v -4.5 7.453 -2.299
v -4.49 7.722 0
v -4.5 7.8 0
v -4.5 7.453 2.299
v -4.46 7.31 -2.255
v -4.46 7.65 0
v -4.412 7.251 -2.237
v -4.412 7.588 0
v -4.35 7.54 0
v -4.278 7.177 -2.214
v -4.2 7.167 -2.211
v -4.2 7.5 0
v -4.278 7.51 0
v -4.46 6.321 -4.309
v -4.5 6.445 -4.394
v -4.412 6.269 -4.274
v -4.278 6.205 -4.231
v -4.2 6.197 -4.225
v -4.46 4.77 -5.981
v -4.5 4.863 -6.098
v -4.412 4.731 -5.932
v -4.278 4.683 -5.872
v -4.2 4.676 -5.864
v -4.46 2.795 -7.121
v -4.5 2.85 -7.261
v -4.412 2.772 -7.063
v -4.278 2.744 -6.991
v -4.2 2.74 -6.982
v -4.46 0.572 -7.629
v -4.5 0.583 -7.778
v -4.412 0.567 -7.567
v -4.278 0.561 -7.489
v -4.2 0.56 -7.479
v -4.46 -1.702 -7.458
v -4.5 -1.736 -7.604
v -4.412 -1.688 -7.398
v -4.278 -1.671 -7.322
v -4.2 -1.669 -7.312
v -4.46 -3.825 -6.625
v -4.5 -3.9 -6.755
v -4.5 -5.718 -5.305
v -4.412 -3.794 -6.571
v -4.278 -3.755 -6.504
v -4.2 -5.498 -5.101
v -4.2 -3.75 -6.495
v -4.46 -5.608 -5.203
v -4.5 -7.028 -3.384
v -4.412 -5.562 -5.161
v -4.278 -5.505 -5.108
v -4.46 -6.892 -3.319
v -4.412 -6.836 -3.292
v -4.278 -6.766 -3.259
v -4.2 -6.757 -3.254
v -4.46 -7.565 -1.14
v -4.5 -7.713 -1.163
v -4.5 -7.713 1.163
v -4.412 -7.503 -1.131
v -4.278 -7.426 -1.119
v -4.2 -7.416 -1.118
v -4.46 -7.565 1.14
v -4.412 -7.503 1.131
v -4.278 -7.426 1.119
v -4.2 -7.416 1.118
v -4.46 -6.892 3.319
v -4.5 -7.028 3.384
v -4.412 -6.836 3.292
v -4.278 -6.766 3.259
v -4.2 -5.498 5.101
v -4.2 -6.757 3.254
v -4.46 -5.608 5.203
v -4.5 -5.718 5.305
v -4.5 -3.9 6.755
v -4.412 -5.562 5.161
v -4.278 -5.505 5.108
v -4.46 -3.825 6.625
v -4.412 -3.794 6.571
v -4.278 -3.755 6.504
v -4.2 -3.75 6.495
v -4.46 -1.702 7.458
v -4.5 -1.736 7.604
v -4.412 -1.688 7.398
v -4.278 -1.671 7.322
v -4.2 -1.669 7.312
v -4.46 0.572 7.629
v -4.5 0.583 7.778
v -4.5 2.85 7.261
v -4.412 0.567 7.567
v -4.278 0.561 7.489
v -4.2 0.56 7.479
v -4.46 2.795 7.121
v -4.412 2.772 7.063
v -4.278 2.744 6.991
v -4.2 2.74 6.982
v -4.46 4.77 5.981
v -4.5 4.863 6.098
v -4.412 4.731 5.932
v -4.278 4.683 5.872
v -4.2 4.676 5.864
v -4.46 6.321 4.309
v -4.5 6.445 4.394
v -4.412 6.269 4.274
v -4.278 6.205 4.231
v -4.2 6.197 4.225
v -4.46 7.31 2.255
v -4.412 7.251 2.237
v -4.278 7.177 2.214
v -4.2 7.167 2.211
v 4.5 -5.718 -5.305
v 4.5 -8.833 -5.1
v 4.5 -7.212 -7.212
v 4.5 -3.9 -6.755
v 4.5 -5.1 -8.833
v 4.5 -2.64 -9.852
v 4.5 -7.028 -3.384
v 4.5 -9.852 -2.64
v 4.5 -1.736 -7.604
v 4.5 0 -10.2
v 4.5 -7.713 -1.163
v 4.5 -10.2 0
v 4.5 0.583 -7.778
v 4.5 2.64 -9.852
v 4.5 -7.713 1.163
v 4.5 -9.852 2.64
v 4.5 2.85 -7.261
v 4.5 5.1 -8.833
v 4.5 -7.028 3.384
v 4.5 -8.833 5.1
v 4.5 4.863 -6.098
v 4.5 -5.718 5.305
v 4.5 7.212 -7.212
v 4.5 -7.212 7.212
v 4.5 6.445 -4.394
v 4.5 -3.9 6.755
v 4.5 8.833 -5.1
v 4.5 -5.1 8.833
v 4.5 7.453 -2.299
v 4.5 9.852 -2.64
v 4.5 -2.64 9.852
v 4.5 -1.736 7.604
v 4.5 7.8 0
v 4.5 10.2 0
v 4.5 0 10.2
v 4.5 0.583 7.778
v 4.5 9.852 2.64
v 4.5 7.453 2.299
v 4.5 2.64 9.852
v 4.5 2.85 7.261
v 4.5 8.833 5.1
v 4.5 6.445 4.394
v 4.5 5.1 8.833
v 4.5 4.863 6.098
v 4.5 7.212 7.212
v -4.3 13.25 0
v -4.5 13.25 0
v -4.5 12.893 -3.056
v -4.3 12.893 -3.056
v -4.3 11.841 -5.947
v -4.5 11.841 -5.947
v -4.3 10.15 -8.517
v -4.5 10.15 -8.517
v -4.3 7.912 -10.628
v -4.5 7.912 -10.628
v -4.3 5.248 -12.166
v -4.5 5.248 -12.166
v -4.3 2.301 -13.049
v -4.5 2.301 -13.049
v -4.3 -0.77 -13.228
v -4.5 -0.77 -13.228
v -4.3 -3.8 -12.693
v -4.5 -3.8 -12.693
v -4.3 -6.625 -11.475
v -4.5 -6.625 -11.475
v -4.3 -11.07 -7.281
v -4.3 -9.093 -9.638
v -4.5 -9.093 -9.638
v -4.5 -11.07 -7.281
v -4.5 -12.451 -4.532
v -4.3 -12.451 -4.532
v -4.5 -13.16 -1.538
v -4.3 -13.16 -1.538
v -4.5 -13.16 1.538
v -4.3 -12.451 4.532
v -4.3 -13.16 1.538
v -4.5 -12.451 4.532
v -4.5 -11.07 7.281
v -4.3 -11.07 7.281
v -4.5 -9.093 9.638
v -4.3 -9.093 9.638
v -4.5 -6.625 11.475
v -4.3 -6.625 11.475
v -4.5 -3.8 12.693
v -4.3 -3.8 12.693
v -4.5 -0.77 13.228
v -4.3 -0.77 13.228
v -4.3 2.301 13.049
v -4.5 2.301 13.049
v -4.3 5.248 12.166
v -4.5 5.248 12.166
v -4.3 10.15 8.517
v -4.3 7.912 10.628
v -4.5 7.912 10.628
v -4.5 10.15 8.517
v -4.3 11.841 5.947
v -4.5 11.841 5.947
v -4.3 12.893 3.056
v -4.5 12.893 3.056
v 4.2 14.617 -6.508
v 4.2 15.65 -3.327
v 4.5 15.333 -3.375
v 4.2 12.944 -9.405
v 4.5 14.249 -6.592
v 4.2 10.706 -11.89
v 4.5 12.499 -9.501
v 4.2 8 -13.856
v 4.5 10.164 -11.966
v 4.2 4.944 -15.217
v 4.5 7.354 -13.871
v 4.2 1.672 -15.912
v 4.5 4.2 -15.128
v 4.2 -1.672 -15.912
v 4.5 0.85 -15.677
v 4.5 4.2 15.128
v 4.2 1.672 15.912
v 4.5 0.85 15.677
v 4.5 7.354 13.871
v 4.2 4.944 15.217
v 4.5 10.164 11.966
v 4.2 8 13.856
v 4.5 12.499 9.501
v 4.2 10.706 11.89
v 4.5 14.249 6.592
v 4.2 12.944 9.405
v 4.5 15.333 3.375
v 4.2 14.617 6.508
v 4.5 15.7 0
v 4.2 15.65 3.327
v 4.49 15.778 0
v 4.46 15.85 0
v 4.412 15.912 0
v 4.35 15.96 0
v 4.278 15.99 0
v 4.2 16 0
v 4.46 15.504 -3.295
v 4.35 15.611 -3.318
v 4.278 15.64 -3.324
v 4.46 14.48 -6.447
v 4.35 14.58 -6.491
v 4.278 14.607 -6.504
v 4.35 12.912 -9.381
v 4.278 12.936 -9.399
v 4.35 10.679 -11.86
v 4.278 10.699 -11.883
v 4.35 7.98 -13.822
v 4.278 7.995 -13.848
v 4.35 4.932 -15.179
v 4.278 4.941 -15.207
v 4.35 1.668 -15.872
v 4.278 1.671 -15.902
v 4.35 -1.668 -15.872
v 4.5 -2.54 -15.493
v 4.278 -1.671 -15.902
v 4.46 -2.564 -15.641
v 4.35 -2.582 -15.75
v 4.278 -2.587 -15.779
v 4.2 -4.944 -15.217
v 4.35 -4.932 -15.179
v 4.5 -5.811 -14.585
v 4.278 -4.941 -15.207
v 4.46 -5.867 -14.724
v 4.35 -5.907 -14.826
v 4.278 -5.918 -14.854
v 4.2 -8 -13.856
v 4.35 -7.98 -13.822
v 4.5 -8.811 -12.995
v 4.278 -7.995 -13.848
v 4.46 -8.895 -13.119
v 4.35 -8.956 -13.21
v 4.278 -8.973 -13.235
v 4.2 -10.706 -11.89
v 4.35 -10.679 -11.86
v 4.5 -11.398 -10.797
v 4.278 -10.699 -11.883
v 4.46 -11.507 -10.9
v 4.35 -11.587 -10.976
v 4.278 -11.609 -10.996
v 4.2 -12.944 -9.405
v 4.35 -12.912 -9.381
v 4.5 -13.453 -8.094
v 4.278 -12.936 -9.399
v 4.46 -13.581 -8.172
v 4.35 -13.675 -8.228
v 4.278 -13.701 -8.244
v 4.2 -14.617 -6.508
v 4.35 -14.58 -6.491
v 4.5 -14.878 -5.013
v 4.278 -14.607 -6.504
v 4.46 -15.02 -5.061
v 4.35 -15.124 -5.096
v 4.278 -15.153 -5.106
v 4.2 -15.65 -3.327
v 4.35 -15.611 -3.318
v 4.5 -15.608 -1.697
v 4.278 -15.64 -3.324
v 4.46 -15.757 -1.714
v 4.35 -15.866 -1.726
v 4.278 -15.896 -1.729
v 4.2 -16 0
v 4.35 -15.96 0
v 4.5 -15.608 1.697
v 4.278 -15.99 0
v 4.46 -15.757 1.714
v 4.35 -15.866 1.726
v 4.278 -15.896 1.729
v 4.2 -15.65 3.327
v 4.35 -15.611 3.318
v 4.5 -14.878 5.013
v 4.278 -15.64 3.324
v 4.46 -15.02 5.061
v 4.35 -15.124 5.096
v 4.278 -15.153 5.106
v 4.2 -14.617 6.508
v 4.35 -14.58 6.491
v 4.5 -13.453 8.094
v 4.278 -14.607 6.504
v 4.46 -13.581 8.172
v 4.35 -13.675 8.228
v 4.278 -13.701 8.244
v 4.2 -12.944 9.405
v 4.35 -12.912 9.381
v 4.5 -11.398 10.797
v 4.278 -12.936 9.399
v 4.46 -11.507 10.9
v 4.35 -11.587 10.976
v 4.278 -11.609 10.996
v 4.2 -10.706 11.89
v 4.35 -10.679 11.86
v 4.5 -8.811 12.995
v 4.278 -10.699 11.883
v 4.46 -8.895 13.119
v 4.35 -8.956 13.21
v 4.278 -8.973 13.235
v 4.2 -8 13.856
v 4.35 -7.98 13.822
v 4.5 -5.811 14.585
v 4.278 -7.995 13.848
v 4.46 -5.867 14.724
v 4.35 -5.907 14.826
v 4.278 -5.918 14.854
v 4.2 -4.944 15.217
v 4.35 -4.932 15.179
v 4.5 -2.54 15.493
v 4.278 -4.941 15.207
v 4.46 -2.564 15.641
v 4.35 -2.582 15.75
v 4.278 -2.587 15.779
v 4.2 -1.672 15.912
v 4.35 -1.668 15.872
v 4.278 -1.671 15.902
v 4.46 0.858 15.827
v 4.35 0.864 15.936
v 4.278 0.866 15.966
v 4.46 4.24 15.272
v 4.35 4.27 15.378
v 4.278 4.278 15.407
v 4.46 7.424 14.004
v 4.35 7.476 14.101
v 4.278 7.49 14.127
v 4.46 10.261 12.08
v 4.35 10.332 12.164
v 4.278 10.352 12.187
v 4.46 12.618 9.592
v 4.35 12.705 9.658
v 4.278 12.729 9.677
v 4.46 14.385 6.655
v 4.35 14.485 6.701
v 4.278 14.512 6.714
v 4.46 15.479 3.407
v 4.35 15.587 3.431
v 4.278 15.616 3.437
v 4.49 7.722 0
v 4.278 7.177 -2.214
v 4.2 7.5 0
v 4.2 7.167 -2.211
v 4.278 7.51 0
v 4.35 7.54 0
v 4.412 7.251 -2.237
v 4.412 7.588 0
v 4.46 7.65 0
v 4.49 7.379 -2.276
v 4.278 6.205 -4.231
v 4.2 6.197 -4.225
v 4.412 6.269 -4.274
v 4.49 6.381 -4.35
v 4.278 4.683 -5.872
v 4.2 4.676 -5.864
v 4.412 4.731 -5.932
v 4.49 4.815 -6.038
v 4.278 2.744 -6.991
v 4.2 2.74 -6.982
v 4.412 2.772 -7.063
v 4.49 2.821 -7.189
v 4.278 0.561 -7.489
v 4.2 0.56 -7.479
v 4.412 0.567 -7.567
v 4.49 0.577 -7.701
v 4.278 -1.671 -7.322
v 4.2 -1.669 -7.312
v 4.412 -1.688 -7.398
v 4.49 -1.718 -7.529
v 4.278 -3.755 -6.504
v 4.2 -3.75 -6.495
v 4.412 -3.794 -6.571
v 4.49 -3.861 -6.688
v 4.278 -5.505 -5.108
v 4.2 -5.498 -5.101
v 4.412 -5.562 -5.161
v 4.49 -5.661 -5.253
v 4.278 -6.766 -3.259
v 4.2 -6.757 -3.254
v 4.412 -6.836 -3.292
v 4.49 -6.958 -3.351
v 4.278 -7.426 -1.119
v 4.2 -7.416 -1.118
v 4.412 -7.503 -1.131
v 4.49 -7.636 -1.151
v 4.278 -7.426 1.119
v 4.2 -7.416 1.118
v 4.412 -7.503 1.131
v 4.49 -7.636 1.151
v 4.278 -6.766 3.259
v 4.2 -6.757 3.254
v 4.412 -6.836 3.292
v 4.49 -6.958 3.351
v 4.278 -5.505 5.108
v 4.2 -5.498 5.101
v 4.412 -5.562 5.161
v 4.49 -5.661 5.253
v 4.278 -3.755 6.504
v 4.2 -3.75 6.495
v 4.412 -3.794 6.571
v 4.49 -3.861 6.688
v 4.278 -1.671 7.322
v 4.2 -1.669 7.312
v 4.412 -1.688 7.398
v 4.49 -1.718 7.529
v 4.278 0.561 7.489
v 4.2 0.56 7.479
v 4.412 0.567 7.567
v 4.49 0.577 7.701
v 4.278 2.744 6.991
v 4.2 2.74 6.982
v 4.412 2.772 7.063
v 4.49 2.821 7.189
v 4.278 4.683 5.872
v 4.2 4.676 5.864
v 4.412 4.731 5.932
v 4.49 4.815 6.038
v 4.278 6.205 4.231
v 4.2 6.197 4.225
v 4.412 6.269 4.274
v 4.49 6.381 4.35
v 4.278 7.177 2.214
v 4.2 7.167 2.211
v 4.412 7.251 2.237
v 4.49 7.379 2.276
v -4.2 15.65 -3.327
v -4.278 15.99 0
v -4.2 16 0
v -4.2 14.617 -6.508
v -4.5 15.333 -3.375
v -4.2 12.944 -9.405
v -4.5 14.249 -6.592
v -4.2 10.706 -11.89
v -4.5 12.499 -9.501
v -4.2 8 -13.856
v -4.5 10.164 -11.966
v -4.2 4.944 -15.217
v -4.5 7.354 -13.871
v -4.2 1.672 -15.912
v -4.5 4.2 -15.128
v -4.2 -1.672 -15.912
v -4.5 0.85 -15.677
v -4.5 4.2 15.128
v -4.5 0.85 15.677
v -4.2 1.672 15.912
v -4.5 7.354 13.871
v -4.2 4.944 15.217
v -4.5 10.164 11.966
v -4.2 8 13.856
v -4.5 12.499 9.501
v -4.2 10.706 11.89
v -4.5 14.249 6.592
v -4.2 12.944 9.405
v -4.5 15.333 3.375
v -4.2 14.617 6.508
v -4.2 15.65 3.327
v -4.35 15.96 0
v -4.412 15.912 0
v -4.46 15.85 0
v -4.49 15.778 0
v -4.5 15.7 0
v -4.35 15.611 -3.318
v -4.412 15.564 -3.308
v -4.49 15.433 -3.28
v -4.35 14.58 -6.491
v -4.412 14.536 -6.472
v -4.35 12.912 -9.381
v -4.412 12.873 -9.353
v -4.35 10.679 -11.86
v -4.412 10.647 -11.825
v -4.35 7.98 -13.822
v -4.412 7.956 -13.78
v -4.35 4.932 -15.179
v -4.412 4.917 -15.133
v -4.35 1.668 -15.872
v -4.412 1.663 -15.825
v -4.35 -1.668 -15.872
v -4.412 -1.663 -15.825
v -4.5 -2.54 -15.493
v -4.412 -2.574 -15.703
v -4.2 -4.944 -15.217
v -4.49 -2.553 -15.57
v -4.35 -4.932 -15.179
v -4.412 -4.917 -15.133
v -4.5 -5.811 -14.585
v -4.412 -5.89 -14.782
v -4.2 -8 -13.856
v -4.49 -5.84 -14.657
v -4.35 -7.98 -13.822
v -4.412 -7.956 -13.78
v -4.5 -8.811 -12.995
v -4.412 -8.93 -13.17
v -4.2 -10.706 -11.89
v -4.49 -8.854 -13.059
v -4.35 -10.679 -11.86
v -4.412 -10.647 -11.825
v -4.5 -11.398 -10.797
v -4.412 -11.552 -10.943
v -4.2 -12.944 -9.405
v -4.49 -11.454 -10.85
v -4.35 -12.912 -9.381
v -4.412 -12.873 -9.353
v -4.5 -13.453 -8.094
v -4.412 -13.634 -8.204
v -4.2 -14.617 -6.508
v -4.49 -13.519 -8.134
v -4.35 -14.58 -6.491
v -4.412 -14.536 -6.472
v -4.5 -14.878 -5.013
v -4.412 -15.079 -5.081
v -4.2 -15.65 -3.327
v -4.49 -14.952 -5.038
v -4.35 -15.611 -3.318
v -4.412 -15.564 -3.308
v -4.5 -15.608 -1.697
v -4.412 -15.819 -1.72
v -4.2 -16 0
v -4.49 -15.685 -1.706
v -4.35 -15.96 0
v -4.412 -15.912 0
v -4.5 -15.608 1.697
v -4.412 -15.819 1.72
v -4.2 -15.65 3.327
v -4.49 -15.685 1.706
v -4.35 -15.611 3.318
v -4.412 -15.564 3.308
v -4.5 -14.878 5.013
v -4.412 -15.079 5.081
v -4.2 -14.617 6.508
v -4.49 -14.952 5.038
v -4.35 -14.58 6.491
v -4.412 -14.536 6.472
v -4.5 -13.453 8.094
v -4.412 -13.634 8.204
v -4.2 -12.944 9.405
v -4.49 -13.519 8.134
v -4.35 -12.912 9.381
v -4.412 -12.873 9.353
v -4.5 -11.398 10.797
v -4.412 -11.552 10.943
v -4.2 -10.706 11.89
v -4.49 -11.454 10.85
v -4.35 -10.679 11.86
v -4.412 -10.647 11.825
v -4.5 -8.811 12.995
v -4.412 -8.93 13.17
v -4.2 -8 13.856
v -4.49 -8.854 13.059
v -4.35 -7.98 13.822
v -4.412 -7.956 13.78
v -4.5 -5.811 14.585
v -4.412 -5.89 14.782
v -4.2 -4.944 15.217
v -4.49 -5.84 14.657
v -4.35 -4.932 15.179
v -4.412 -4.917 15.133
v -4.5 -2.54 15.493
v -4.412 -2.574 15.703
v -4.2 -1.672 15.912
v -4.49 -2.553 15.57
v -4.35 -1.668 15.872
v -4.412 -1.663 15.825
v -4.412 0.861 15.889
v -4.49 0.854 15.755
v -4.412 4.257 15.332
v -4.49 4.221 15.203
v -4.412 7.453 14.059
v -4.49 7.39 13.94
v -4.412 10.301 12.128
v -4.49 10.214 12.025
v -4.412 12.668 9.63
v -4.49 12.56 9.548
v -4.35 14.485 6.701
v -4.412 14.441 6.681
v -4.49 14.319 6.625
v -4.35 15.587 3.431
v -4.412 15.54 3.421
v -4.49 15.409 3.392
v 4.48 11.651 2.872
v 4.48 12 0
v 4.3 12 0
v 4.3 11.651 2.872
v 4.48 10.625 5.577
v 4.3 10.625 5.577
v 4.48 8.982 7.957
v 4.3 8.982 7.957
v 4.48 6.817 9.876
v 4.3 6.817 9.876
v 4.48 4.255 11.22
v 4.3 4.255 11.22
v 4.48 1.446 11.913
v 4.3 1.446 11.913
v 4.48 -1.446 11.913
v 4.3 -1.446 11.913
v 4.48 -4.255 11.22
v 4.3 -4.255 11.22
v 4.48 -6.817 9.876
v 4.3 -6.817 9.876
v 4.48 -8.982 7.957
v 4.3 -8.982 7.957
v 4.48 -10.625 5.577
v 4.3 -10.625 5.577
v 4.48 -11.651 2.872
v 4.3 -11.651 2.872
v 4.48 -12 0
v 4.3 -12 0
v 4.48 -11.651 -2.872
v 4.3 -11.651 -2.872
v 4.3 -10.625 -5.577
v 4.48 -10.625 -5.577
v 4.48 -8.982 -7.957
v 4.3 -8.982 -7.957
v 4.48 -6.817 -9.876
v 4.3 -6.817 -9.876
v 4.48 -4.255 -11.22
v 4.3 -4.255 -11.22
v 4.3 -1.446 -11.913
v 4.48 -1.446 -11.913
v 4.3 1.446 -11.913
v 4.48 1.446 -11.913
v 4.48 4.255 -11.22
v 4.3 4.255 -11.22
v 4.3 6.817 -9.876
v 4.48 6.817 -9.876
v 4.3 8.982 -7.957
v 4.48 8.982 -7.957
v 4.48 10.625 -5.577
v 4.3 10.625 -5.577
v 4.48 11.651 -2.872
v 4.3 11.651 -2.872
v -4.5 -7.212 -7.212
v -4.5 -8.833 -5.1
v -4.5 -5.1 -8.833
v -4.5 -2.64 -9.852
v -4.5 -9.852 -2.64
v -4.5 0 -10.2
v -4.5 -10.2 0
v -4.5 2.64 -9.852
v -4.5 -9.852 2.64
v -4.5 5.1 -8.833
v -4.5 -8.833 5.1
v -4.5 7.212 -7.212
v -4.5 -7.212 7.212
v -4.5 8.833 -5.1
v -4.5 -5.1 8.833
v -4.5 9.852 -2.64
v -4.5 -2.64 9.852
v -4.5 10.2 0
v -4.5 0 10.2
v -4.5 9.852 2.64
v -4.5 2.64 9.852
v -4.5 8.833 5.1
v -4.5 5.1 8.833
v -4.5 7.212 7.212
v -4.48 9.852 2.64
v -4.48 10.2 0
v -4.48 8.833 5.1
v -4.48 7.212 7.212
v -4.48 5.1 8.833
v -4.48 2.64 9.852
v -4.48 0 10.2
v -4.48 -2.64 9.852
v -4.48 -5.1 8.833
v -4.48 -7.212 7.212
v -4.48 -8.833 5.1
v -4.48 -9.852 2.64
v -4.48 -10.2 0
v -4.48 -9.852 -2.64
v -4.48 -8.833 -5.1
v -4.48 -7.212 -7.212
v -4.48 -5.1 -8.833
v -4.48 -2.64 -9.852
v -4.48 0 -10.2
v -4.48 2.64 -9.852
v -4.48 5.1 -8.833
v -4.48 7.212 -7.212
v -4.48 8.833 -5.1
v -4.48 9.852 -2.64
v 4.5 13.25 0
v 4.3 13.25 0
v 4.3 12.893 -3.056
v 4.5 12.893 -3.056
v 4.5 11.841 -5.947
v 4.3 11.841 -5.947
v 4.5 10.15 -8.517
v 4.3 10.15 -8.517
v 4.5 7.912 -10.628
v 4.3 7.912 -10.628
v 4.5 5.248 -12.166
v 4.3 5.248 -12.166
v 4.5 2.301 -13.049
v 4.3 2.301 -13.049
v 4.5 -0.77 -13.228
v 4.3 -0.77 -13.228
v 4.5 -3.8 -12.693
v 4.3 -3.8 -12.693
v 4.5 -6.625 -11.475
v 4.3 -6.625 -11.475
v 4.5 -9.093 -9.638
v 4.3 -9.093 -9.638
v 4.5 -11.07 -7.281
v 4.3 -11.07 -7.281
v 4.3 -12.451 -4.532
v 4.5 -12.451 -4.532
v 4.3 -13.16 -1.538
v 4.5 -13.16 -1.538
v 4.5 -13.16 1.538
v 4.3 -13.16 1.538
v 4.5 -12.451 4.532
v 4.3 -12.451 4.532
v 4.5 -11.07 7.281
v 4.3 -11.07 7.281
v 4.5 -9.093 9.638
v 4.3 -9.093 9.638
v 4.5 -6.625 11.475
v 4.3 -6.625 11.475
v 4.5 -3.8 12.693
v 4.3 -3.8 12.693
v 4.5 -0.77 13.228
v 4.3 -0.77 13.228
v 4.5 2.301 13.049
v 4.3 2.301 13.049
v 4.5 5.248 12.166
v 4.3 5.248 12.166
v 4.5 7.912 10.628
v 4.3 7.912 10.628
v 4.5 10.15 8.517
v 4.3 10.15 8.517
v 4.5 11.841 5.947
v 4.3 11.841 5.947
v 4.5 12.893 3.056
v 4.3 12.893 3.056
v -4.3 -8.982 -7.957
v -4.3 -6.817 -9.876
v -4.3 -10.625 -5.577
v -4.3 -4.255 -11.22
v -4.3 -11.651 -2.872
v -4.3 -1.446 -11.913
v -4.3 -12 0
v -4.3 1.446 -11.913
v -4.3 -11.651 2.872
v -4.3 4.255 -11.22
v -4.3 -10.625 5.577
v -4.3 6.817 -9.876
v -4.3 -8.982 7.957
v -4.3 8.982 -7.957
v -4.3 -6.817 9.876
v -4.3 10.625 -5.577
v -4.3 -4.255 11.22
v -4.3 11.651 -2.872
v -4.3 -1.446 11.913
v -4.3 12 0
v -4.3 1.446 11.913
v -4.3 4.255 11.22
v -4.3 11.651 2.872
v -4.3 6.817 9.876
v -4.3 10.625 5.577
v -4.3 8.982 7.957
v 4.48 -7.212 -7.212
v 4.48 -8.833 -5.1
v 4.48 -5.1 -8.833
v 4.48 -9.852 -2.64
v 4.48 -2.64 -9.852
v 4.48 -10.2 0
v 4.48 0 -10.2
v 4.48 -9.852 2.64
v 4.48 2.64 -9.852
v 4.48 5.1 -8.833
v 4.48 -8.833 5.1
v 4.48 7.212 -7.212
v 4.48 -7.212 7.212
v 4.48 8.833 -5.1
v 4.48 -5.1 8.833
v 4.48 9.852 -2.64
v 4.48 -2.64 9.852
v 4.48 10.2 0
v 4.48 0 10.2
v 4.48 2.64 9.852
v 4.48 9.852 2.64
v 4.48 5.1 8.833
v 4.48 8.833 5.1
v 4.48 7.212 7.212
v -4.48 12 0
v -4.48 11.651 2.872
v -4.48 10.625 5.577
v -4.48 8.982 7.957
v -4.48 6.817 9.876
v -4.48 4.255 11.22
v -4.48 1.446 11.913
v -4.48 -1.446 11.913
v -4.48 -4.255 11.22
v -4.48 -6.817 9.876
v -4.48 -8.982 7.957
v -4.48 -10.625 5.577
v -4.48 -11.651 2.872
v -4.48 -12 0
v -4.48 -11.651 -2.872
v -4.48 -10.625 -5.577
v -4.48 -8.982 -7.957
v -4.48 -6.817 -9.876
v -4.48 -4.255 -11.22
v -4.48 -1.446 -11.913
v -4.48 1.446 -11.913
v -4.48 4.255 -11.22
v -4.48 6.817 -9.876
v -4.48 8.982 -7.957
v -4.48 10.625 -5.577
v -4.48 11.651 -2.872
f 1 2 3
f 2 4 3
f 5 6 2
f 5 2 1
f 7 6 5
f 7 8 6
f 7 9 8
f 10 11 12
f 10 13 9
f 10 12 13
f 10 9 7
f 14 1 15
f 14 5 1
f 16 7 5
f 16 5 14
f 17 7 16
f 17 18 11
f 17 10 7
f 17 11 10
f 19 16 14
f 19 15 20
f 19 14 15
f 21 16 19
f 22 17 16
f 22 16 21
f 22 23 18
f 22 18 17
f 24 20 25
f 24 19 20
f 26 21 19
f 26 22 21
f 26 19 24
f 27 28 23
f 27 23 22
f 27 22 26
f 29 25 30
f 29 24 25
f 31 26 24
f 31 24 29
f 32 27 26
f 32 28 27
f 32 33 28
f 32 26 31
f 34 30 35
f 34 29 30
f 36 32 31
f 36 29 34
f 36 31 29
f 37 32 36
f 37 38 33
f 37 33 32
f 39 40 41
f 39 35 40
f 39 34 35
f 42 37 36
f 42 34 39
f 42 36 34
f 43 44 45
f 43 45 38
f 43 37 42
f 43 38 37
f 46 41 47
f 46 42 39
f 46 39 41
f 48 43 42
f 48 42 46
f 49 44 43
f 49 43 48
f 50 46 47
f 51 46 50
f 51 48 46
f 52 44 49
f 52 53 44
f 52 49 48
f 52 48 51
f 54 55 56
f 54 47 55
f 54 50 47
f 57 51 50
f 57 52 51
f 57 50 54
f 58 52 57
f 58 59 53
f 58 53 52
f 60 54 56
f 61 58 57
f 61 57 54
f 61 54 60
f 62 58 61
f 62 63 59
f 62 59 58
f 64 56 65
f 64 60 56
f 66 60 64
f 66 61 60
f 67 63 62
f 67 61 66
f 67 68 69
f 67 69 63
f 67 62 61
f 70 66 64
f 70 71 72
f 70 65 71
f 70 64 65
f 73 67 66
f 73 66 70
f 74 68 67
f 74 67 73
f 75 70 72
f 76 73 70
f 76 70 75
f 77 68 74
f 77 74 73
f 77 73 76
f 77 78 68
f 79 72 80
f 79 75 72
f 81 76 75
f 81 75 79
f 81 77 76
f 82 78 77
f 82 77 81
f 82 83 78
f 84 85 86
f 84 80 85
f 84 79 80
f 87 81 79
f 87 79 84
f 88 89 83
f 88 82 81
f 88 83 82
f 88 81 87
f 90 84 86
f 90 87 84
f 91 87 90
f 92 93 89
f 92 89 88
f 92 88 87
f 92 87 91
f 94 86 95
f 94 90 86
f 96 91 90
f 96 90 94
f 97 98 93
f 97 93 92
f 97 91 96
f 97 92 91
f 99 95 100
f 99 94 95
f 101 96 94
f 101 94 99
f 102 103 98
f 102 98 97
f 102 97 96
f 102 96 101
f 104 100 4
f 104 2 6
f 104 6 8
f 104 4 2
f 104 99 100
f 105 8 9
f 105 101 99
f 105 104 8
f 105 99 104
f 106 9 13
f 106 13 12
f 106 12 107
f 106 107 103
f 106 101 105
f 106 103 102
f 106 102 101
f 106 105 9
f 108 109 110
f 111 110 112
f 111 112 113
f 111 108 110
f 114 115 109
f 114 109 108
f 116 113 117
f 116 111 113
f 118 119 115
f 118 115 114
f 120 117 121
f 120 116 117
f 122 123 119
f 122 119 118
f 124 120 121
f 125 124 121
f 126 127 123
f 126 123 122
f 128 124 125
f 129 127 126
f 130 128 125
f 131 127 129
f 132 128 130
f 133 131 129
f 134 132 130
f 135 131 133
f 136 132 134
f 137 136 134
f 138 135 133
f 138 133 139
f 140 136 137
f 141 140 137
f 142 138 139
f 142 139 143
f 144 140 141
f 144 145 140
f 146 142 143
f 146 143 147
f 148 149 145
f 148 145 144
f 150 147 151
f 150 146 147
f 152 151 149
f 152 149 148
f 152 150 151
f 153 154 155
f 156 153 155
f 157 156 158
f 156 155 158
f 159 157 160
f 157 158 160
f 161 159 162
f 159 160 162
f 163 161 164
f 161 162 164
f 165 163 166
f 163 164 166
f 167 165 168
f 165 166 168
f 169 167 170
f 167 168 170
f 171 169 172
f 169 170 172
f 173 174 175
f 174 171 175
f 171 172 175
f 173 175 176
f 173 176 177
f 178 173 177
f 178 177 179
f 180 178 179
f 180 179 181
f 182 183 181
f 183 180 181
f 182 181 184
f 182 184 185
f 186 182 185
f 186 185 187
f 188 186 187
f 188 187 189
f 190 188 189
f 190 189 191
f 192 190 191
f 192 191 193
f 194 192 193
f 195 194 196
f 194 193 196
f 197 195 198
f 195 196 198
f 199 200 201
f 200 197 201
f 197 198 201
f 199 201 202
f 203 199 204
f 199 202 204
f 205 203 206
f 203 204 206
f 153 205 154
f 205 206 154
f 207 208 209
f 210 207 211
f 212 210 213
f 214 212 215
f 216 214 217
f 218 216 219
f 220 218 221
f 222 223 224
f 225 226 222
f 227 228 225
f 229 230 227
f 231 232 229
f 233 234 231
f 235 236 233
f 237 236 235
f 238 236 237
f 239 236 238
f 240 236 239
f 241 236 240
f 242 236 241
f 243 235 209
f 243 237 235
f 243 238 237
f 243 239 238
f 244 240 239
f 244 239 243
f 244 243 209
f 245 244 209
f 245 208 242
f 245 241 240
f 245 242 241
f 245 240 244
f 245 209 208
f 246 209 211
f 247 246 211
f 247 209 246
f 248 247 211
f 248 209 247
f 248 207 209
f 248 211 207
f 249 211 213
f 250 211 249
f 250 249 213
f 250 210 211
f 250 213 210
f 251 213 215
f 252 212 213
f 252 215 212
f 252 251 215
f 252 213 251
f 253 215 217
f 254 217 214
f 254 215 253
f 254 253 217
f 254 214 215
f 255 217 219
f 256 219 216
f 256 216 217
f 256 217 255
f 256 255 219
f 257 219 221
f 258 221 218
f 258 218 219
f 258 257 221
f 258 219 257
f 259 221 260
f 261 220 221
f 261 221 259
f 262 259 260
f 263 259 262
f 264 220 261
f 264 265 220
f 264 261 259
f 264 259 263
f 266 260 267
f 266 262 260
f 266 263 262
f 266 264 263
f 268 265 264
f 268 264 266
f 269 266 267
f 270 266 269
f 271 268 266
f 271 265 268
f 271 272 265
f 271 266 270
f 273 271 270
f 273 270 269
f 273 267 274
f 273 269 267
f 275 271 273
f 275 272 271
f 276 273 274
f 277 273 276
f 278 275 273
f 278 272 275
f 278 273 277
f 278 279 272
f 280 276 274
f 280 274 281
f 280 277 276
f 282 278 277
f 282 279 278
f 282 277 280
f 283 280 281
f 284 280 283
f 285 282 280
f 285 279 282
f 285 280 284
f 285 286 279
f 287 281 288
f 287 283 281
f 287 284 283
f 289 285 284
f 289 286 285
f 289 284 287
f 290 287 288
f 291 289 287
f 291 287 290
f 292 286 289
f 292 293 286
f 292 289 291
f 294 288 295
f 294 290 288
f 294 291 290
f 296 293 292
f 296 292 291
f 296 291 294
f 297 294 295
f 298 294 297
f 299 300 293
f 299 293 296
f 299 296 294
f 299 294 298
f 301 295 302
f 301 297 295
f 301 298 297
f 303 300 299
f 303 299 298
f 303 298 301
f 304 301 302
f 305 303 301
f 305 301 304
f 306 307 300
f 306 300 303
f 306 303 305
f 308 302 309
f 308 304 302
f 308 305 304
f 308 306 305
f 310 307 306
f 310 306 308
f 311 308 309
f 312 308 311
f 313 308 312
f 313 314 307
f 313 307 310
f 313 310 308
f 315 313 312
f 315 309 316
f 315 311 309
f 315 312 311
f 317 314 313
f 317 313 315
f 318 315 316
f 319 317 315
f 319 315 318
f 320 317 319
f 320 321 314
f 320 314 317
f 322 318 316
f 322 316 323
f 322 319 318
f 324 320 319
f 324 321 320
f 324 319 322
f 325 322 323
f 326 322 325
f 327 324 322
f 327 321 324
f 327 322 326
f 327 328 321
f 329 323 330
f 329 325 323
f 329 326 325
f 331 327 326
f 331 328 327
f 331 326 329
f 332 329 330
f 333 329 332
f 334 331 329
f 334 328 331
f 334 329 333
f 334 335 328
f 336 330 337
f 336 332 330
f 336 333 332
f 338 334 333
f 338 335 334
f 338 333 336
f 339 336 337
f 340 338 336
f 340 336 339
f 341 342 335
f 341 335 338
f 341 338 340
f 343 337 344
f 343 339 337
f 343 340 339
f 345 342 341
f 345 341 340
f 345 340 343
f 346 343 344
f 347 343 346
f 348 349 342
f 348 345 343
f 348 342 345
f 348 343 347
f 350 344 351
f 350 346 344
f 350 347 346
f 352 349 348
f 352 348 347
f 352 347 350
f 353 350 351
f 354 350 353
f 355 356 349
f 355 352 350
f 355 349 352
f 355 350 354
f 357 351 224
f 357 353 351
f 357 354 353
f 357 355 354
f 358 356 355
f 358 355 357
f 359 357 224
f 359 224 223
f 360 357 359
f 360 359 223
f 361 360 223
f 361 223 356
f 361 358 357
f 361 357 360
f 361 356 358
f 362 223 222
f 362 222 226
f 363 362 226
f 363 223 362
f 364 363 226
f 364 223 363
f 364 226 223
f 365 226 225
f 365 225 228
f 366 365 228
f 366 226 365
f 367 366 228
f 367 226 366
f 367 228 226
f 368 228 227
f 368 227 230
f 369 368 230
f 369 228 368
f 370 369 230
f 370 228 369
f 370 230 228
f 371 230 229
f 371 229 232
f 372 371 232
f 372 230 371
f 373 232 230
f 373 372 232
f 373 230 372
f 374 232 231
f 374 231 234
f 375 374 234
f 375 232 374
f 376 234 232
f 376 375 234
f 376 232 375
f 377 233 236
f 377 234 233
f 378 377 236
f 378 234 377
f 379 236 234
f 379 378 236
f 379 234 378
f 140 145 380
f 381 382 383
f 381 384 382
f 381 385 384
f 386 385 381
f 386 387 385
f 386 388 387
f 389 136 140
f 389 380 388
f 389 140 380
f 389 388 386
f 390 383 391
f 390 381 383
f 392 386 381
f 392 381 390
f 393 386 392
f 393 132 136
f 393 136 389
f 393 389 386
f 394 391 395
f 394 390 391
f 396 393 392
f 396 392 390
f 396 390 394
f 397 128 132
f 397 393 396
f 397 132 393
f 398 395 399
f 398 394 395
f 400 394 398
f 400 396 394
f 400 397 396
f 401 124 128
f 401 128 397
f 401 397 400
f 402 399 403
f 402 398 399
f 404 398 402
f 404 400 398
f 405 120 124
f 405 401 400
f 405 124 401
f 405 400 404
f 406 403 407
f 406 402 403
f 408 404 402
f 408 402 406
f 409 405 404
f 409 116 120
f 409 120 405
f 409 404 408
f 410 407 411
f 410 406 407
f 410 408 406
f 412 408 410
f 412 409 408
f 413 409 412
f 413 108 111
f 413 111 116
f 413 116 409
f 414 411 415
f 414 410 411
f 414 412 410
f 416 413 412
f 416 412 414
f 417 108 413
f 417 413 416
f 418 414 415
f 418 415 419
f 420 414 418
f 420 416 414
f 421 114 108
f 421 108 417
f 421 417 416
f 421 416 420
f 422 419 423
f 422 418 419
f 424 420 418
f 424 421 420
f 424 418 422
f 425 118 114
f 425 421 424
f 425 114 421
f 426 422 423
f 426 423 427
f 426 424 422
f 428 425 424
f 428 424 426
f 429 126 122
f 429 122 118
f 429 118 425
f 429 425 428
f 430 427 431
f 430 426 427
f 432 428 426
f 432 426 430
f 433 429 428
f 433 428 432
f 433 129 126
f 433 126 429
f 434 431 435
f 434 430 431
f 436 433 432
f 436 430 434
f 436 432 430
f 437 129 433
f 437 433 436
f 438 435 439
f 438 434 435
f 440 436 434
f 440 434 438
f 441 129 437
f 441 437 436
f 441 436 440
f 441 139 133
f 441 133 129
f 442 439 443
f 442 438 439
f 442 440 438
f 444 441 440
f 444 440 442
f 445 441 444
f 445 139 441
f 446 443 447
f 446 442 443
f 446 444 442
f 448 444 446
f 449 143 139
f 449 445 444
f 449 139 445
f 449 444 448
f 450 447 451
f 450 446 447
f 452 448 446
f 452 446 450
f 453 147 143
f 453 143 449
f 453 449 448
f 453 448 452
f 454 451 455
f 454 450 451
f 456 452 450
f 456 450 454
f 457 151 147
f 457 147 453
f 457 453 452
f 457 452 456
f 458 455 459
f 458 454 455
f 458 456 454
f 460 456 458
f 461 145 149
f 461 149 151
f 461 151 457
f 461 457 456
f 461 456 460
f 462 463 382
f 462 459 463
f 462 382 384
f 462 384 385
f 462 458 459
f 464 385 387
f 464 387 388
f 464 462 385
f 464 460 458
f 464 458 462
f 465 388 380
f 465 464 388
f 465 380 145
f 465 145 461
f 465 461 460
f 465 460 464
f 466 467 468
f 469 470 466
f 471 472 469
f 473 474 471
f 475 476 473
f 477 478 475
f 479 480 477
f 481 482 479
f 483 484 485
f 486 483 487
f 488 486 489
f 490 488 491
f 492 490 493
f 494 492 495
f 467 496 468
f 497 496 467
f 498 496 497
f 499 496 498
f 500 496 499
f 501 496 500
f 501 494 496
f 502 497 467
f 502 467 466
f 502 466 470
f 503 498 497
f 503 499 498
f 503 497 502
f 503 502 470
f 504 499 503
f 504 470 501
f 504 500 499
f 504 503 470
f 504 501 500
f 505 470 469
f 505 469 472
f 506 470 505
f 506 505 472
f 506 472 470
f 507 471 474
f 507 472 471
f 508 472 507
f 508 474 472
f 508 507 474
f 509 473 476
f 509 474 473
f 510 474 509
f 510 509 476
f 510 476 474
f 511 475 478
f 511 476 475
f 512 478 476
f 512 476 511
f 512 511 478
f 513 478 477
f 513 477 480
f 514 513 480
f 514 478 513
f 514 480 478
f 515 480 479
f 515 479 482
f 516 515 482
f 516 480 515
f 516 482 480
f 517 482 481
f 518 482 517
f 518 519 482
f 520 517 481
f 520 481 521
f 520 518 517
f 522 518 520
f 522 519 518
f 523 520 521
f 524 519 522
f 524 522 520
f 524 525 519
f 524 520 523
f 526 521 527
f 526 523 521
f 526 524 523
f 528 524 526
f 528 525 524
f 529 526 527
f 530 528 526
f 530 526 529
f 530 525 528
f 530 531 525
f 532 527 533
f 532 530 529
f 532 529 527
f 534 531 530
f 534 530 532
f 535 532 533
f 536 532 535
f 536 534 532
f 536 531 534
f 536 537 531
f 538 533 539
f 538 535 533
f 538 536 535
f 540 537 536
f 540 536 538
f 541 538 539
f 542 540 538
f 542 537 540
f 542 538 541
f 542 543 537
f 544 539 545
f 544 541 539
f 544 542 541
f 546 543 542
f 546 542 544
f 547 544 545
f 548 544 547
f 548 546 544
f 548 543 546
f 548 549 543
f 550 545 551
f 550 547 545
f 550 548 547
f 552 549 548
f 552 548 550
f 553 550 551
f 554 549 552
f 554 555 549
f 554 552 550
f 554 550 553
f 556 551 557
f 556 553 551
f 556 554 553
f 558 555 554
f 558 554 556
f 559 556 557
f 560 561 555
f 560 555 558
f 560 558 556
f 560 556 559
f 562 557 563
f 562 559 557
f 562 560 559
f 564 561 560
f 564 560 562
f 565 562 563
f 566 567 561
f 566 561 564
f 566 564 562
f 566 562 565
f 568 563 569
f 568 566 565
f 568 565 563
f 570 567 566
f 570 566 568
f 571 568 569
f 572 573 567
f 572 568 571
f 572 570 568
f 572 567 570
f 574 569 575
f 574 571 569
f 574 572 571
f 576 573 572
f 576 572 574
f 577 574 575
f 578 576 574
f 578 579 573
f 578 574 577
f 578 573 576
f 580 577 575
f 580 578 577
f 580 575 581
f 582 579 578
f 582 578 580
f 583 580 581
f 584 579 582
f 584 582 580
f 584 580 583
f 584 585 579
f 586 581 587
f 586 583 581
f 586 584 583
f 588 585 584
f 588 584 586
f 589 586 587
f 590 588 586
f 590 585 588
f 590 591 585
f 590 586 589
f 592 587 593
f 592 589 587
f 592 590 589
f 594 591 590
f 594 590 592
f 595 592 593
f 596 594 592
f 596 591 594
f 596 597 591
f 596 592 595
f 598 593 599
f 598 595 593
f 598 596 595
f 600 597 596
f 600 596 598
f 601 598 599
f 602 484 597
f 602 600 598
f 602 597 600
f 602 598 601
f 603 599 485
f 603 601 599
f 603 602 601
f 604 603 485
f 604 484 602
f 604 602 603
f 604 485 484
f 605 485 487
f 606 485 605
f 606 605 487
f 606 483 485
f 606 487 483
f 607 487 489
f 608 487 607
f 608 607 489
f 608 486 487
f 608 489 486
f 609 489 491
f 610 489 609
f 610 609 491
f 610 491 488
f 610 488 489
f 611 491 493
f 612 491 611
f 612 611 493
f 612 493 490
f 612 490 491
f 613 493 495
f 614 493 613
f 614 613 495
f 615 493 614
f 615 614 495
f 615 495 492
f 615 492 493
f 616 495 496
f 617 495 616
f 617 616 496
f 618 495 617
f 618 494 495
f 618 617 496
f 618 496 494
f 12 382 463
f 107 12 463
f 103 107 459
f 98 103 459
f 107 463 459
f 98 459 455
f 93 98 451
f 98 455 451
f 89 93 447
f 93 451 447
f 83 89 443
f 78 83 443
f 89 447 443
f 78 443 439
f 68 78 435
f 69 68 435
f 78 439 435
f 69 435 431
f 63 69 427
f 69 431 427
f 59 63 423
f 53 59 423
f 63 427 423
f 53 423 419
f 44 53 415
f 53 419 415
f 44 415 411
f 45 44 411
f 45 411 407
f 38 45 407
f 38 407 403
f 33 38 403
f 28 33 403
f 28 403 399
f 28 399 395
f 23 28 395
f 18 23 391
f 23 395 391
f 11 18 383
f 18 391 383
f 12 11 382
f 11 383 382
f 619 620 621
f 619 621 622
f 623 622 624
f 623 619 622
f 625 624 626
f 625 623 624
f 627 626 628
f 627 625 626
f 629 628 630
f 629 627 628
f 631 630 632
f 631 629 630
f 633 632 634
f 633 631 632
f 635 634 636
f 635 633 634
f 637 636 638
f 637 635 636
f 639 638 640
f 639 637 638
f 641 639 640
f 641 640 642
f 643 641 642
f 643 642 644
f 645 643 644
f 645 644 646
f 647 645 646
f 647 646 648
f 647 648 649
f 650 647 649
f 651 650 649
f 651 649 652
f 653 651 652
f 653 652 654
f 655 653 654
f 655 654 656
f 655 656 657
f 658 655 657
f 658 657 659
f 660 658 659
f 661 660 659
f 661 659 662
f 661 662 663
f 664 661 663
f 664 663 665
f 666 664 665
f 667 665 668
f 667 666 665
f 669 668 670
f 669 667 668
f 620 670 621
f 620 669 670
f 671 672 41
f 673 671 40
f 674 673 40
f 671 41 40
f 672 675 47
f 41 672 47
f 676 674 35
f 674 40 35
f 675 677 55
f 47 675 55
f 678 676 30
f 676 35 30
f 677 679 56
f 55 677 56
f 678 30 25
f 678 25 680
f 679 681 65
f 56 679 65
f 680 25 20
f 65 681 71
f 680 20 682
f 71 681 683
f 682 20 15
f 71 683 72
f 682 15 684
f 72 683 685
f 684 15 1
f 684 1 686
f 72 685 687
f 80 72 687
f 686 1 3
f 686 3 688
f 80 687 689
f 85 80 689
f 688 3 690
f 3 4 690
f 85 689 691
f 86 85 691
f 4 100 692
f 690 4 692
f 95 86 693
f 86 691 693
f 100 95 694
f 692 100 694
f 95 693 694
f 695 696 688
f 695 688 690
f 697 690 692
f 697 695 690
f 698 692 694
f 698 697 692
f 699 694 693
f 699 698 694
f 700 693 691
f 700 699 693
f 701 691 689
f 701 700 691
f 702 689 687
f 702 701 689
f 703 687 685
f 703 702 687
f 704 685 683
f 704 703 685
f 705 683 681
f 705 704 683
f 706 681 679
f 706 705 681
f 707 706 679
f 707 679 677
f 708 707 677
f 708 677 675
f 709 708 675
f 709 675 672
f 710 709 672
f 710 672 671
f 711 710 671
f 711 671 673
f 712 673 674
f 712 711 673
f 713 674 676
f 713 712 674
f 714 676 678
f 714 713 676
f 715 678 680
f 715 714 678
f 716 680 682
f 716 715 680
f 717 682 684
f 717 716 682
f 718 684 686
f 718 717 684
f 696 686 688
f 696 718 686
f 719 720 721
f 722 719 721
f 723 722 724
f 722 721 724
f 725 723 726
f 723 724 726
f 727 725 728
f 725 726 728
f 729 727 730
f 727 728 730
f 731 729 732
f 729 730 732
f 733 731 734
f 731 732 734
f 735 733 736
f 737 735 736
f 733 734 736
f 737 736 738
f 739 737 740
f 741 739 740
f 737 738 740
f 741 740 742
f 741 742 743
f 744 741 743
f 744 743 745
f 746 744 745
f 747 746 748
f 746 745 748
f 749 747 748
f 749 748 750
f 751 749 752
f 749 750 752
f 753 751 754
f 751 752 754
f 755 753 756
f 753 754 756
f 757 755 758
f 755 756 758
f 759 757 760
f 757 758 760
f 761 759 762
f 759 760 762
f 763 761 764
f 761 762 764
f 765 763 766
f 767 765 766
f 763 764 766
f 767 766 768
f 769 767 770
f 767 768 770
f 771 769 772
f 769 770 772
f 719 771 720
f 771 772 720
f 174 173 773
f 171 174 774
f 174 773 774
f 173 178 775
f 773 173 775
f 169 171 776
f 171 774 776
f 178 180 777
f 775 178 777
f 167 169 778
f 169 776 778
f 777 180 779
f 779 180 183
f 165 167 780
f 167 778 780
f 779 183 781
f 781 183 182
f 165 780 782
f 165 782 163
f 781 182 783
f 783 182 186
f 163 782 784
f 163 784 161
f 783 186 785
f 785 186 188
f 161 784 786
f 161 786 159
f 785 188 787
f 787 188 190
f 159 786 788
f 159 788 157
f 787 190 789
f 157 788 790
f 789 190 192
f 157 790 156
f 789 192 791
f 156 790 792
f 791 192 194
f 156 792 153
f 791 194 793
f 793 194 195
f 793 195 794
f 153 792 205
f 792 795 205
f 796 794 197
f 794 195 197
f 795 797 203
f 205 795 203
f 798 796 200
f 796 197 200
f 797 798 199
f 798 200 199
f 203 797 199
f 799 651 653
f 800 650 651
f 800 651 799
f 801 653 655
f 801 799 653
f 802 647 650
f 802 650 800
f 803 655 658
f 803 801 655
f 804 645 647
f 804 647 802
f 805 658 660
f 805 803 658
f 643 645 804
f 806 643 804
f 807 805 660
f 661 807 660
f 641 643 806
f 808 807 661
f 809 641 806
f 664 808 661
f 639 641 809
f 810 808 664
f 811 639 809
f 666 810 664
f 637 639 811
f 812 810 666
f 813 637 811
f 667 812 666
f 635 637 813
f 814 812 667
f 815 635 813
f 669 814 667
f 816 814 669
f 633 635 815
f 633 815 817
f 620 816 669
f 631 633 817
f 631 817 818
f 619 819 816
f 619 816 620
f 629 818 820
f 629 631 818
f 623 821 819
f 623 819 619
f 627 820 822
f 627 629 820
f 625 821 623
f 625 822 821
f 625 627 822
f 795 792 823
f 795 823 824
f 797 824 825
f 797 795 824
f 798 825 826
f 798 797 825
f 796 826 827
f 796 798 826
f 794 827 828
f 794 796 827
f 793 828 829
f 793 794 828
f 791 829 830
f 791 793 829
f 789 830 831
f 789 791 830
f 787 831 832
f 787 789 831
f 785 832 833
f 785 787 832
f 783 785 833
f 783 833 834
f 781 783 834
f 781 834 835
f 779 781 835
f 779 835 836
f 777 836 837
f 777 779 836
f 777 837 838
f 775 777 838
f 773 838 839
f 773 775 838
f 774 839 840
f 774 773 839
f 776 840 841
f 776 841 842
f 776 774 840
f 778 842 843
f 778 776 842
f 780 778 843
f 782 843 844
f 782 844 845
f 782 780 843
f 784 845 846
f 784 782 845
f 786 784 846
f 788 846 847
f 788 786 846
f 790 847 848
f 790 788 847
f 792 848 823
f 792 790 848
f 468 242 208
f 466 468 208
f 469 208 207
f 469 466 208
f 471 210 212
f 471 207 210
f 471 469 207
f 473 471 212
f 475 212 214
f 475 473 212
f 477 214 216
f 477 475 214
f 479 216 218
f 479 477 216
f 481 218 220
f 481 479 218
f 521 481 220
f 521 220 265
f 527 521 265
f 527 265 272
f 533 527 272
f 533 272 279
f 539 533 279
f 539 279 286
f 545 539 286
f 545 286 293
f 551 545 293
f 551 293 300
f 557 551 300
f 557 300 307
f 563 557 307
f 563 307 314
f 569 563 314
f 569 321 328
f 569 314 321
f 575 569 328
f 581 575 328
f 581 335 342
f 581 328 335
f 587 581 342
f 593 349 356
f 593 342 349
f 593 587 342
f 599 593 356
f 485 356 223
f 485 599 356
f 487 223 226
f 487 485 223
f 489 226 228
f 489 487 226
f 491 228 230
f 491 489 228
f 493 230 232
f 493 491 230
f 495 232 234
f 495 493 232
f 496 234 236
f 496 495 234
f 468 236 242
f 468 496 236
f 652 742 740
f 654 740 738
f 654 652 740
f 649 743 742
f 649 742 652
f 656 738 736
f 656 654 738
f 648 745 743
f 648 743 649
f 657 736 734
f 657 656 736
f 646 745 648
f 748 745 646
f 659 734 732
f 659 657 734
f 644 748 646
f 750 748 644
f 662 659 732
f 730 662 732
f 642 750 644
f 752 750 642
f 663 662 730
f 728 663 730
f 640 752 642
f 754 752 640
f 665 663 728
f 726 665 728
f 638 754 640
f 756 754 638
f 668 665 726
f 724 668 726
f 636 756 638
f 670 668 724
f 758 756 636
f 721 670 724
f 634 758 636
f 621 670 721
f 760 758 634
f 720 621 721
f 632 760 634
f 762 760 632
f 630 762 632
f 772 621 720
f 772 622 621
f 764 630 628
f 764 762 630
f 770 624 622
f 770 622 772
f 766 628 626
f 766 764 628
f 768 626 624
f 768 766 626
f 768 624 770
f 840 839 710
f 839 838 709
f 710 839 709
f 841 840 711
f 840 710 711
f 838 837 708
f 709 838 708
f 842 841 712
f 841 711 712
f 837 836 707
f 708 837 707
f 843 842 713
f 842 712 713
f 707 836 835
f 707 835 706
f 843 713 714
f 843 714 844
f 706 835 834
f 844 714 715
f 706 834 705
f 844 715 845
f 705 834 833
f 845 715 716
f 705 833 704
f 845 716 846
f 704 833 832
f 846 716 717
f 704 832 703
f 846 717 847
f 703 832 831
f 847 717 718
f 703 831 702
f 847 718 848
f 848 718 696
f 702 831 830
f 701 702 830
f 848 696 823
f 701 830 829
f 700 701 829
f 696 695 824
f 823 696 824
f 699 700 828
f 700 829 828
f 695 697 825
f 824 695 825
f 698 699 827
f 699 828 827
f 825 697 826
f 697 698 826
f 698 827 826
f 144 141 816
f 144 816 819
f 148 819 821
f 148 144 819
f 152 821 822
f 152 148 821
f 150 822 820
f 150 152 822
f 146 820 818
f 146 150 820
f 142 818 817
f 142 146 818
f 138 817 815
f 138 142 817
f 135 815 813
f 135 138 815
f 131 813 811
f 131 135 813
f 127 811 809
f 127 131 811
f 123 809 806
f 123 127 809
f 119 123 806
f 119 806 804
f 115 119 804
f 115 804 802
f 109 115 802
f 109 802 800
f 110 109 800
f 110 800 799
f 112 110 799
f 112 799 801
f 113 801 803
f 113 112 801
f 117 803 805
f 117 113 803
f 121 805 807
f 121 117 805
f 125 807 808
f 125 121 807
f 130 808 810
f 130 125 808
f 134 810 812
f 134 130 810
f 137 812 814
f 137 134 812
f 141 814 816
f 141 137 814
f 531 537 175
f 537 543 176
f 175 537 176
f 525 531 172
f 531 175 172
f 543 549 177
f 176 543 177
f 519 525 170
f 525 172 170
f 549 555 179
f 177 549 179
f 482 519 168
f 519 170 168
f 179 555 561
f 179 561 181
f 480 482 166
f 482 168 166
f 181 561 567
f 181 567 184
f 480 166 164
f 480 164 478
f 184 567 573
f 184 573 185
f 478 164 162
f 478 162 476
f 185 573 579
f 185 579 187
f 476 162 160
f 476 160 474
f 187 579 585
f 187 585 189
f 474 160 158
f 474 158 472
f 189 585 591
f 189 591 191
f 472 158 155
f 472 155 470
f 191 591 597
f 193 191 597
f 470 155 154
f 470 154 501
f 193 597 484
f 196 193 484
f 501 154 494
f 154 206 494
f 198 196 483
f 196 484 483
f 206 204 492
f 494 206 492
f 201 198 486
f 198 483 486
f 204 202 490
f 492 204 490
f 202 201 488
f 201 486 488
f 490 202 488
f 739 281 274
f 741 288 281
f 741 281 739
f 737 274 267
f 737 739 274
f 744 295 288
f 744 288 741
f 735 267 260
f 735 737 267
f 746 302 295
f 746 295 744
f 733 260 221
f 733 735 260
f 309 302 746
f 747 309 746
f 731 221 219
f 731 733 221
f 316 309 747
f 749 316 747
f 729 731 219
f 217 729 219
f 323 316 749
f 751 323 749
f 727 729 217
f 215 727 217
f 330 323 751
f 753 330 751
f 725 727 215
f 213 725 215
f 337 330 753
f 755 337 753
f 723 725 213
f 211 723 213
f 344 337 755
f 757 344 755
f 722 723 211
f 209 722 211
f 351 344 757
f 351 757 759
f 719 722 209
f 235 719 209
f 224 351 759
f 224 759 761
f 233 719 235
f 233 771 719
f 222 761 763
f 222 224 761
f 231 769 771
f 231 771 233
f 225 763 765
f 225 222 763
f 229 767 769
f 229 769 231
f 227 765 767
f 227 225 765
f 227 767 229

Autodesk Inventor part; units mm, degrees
sketch "Sketch_1" plane through (0, 0, 0) normal (0, 0, 1) x (1, 0, 0)
  line L0 (50, 0) -> (-50, 0)
  arc A0 (-4.5, 7.8) -> (-4.2, 7.5) centre (-4.2, 7.8) ccw
  line L1 (-4.2, 7.5) -> (4.2, 7.5)
  arc A1 (4.2, 7.5) -> (4.5, 7.8) centre (4.2, 7.8) ccw
  line L2 (4.5, 7.8) -> (4.5, 15.7)
  arc A2 (4.5, 15.7) -> (4.2, 16) centre (4.2, 15.7) ccw
  line L3 (4.2, 16) -> (-4.2, 16)
  arc A3 (-4.2, 16) -> (-4.5, 15.7) centre (-4.2, 15.7) ccw
  line L4 (-4.5, 15.7) -> (-4.5, 7.8)
revolve "Revolution1" add sketch "Sketch_1" angle 360 about axis through (50, 0, 0) along (1, 0, 0)
sketch "Sketch_2" plane through (0, 0, 0) normal (0, 0, 1) x (1, 0, 0)
  line L0 (50, 0) -> (-50, 0)
  line L1 (-6.3, 13.25) -> (-6.3, 7.5)
  line L2 (-6.3, 7.5) -> (-4.5, 7.5)
  line L3 (-4.5, 7.5) -> (-4.5, 10.2)
  line L4 (-4.5, 10.2) -> (-4.48, 10.2)
  line L5 (-4.48, 10.2) -> (-4.48, 12)
  line L6 (-4.48, 12) -> (-4.3, 12)
  line L7 (-4.3, 12) -> (-4.3, 13.25)
  line L8 (-4.3, 13.25) -> (-6.3, 13.25)
revolve "Revolution2" cut sketch "Sketch_2" angle 360 about axis through (50, 0, 0) along (1, 0, 0)
sketch "Sketch_3" plane through (0, 0, 0) normal (0, 0, 1) x (1, 0, 0)
  line L0 (50, 0) -> (-50, 0)
  line L1 (4.3, 12) -> (4.48, 12)
  line L2 (4.48, 12) -> (4.48, 10.2)
  line L3 (4.48, 10.2) -> (4.5, 10.2)
  line L4 (4.5, 10.2) -> (4.5, 7.5)
  line L5 (4.5, 7.5) -> (6.3, 7.5)
  line L6 (6.3, 7.5) -> (6.3, 13.25)
  line L7 (6.3, 13.25) -> (4.3, 13.25)
  line L8 (4.3, 13.25) -> (4.3, 12)
revolve "Revolution3" cut sketch "Sketch_3" angle 360 about axis through (50, 0, 0) along (1, 0, 0)
ref_plane "bf_2_XY" through (0, 0, 0) normal (1, 0, 0) x (0, 0, -1)
ref_plane "bf_2_YZ" through (0, 0, 0) normal (0, 0, -1) x (0, 1, 0)
ref_plane "bf_2_ZX" through (0, 0, 0) normal (0, 1, 0) x (1, 0, 0)
properties part number "BF 15 Part2"
